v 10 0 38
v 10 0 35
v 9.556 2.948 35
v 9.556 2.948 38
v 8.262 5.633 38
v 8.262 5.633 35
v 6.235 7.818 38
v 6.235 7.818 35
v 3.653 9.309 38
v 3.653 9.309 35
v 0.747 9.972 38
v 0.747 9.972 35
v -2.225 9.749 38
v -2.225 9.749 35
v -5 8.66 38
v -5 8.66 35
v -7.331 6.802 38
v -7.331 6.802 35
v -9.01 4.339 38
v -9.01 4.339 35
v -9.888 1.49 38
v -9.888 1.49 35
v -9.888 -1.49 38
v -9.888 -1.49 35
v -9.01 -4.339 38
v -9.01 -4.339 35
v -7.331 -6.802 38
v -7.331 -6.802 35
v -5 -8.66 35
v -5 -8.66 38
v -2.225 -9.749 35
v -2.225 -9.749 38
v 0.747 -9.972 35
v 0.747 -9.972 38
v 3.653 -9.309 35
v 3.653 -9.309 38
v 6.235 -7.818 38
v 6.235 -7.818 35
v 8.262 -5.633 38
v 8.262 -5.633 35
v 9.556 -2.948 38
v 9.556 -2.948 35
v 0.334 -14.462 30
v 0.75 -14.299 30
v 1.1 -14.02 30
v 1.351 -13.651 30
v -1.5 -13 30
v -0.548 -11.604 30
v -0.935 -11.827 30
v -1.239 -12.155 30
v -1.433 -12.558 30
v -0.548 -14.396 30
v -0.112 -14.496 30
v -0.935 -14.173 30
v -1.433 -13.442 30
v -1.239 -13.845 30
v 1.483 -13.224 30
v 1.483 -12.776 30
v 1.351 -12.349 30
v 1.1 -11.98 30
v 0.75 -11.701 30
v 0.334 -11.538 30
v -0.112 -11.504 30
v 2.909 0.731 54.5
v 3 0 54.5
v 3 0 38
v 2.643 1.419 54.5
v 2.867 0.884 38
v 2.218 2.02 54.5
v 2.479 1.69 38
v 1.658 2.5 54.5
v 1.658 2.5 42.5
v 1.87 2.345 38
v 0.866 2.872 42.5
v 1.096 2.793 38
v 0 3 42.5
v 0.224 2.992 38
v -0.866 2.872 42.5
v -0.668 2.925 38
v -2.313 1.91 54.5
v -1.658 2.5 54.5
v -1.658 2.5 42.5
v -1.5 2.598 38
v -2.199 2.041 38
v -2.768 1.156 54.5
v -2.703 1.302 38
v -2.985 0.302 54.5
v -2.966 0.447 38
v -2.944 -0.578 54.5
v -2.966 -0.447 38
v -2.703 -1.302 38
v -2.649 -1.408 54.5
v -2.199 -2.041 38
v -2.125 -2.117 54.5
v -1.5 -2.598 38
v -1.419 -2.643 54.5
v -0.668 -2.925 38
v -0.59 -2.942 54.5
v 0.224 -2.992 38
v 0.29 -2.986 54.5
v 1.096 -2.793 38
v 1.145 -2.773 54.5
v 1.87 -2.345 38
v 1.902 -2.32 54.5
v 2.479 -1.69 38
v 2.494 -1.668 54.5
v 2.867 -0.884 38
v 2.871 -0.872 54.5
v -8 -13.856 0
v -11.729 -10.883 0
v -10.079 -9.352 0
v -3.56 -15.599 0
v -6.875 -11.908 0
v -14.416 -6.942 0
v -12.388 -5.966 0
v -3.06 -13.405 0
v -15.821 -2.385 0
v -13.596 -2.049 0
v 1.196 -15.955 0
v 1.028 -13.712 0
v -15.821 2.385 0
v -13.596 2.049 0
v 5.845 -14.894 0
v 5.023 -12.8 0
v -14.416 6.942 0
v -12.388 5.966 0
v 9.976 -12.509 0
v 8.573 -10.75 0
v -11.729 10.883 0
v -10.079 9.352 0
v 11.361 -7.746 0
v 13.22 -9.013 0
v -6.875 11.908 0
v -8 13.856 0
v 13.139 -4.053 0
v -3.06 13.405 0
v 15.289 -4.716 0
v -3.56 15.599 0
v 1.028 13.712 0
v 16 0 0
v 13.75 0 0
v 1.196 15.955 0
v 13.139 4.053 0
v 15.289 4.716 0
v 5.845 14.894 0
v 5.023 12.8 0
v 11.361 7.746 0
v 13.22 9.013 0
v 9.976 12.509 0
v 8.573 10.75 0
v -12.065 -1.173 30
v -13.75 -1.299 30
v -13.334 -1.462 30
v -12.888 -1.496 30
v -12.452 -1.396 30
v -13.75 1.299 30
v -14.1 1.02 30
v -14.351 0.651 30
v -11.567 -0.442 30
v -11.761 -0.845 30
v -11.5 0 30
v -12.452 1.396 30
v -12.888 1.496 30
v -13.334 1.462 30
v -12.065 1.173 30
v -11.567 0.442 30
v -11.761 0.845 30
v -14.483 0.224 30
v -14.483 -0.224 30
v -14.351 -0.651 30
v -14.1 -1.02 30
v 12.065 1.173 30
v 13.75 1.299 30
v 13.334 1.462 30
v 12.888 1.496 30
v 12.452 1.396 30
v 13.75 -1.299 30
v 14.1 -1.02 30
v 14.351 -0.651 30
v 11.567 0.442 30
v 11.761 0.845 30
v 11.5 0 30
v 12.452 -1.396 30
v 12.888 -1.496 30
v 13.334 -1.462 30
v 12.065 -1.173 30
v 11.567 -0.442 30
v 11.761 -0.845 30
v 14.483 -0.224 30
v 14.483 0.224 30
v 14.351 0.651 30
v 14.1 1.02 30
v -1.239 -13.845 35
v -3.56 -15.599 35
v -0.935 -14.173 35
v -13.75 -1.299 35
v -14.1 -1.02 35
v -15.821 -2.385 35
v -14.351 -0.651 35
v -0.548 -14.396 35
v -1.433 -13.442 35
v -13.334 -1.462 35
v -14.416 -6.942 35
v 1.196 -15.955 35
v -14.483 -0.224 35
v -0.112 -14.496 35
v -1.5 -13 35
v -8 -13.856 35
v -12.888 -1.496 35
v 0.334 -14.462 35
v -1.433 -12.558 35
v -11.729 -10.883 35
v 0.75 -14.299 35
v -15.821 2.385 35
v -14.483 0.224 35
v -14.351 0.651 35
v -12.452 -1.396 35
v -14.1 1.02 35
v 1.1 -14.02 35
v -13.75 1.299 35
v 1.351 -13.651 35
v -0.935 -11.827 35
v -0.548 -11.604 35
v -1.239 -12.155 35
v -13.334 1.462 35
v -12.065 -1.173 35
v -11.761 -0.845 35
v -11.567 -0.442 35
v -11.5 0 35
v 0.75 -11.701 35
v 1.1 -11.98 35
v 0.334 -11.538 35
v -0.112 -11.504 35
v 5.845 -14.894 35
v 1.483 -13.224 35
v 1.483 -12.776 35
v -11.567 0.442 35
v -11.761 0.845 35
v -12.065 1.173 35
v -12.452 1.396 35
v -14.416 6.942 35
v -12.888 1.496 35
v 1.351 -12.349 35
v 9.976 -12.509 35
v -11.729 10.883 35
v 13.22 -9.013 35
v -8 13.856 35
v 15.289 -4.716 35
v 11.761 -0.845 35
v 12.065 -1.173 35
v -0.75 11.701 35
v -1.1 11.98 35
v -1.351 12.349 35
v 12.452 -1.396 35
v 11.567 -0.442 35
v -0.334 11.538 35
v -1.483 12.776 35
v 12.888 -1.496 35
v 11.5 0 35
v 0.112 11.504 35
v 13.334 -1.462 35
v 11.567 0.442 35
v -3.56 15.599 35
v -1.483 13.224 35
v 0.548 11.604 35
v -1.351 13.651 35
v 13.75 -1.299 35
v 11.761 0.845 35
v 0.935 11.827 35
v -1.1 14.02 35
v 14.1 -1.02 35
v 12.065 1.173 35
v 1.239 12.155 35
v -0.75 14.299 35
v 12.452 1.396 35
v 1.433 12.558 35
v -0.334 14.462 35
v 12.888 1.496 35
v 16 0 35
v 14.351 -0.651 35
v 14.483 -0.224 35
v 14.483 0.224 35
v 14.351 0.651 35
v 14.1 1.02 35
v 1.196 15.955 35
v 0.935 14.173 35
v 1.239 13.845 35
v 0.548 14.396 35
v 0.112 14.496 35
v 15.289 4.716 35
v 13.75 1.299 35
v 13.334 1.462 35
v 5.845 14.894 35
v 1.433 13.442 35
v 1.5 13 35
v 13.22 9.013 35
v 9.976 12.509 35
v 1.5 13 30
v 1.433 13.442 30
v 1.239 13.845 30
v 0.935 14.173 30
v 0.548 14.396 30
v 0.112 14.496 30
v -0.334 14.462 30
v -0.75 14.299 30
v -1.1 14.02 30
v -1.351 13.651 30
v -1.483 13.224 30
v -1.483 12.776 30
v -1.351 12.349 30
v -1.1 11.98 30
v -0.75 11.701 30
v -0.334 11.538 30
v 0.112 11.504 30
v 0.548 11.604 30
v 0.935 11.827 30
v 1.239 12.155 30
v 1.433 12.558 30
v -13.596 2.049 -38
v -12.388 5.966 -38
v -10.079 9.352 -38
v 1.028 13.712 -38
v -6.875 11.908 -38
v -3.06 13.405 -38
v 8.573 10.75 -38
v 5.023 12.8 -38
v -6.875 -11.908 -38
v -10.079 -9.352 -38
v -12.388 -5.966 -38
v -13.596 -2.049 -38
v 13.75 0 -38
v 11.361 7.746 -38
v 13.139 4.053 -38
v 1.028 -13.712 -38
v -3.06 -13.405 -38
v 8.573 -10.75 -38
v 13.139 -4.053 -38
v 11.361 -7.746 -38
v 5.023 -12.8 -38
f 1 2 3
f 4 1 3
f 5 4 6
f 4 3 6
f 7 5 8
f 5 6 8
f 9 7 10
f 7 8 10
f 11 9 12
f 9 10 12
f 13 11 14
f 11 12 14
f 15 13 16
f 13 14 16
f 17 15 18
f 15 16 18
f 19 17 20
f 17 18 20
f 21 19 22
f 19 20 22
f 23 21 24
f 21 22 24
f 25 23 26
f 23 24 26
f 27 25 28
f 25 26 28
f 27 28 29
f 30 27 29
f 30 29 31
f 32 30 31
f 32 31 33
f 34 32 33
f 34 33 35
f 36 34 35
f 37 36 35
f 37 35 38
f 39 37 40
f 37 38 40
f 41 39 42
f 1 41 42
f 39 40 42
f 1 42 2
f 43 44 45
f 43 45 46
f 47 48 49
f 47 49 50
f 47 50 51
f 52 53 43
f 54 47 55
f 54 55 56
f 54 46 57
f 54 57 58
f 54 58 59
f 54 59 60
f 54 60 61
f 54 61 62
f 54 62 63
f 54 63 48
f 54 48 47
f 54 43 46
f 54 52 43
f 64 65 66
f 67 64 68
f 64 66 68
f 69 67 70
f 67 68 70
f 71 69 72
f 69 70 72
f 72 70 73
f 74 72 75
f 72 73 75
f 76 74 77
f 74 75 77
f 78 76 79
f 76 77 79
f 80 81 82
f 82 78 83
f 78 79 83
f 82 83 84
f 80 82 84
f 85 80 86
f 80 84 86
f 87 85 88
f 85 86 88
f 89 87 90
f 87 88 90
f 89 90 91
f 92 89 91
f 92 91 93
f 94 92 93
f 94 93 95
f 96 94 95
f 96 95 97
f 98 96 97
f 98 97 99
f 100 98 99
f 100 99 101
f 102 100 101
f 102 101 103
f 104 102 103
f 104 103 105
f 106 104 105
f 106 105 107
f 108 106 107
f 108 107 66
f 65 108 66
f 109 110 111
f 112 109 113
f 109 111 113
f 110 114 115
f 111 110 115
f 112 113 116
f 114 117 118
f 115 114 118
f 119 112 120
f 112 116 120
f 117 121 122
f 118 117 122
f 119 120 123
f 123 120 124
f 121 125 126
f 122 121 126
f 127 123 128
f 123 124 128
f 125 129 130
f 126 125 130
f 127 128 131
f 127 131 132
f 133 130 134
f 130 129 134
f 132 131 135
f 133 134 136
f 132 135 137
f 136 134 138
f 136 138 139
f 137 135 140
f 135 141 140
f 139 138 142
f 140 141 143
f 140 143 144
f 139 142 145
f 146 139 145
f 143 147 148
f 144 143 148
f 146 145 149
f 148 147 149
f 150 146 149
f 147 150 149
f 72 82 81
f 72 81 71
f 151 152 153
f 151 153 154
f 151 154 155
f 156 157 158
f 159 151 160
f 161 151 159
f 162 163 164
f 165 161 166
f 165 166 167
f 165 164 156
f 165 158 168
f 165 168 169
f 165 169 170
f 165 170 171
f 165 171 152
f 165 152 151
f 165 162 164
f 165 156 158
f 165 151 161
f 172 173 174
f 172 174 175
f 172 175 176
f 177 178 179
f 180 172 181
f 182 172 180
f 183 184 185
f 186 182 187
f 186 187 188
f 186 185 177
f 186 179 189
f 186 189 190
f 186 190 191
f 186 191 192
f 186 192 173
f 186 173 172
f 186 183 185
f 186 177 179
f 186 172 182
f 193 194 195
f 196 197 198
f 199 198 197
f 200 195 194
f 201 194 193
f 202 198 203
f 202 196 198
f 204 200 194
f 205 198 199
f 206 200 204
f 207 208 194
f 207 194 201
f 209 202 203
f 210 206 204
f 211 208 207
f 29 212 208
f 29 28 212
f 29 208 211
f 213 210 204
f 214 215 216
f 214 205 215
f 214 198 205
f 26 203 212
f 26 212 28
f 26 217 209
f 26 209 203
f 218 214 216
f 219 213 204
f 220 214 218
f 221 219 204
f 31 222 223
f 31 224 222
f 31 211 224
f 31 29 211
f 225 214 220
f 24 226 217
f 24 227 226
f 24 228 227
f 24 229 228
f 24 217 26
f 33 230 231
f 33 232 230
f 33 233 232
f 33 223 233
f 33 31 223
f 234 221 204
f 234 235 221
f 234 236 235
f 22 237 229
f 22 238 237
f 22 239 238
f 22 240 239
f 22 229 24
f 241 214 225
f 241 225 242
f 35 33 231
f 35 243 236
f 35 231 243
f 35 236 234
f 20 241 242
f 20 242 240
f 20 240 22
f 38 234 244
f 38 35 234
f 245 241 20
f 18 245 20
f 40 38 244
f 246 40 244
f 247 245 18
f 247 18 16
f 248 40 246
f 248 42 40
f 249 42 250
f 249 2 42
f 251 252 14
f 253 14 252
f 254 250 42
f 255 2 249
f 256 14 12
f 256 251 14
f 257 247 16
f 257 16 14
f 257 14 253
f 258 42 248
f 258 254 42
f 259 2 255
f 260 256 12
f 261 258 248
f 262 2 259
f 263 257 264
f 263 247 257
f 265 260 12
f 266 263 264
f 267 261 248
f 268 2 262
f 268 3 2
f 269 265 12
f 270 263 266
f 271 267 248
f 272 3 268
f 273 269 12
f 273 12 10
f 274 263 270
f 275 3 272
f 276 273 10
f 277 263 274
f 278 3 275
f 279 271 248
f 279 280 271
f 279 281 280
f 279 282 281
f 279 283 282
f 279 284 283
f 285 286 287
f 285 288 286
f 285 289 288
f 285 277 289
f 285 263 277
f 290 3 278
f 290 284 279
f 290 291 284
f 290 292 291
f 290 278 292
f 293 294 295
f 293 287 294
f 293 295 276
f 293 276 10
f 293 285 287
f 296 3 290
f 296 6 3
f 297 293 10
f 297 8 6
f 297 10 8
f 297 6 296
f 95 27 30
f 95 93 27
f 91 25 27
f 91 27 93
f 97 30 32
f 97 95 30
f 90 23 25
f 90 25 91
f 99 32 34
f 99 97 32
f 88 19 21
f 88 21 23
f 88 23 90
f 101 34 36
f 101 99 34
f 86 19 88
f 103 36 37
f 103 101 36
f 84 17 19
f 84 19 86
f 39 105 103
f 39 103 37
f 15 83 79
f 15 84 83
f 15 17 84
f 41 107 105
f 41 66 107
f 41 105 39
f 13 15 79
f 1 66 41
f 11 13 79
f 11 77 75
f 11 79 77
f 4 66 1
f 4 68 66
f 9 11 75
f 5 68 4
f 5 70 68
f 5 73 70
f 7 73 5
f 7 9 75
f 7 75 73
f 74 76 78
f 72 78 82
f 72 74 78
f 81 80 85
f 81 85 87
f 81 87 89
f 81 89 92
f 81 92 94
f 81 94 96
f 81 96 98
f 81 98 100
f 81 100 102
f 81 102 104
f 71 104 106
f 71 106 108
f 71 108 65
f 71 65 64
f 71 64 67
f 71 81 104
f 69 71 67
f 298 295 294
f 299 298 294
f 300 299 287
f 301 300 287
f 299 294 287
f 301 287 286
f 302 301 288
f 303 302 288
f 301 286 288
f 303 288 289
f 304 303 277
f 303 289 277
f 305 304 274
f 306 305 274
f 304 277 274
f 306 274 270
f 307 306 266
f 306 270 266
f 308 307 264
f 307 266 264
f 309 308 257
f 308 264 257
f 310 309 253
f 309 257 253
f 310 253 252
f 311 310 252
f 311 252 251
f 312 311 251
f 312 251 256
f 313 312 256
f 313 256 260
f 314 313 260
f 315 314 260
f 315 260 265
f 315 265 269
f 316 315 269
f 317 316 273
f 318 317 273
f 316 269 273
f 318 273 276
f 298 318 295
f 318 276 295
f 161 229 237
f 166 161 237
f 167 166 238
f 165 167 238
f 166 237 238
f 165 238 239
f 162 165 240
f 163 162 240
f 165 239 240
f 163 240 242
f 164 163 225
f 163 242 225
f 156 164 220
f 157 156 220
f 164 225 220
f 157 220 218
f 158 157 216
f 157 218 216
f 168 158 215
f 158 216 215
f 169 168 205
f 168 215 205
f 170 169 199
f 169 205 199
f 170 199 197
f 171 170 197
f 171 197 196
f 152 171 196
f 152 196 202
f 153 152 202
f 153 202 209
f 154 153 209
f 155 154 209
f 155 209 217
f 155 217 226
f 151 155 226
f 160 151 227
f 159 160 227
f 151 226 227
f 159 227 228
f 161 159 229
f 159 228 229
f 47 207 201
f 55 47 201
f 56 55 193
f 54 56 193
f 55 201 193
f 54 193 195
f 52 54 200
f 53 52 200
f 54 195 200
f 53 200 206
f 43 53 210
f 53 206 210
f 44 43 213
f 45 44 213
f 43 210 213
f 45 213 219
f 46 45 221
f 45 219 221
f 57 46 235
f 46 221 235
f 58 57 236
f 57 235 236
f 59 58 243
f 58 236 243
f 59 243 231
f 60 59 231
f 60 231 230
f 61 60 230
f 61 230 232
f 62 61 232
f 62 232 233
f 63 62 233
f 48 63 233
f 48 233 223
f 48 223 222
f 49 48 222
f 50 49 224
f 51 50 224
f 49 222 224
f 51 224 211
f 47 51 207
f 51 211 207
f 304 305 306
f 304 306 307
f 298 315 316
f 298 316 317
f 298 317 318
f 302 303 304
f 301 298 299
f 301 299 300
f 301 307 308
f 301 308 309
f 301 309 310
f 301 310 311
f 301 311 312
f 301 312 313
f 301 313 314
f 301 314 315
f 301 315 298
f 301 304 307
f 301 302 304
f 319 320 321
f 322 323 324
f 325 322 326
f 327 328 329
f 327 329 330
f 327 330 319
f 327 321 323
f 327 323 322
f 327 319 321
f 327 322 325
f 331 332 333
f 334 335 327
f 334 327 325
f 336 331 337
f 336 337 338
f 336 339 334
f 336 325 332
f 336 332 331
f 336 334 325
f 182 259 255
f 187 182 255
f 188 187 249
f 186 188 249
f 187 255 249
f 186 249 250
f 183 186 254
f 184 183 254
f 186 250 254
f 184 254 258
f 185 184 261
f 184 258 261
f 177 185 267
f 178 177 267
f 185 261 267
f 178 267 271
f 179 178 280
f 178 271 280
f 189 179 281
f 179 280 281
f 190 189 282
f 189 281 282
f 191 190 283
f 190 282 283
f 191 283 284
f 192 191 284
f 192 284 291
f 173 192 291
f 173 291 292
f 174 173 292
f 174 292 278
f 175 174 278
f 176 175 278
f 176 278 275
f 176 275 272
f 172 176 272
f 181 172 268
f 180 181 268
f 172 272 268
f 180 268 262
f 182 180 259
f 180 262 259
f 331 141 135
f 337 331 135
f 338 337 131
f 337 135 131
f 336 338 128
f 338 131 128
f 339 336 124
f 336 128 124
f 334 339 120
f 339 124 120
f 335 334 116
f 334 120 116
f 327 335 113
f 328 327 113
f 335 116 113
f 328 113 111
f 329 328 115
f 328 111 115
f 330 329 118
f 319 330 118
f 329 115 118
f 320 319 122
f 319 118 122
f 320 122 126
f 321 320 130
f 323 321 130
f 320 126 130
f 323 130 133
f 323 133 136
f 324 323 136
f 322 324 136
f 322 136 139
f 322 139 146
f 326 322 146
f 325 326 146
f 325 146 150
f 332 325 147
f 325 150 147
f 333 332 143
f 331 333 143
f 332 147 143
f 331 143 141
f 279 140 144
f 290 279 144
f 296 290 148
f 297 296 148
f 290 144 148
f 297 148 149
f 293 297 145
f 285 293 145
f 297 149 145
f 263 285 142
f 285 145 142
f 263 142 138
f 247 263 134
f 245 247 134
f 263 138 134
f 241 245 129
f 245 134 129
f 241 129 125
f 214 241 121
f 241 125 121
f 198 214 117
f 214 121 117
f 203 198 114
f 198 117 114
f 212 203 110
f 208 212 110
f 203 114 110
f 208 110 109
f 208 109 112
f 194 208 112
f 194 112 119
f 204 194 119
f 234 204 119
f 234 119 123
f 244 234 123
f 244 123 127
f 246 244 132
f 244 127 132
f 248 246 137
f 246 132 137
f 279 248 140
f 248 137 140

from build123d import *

# Parameters (mm, degrees)
SKETCH_1_R          = 16
EXTRUDE_1_DEPTH     = 35
SKETCH_2_R          = 10
EXTRUDE_2_DEPTH     = 3
SKETCH_3_R          = 3
EXTRUDE_3_DEPTH     = 16.5
CUT_EXTRUDE_START   = 3
SKETCH_4_W          = 9.243576196
SKETCH_4_H          = 12
CUT_EXTRUDE_1_DEPTH = 0.5
SKETCH_5_R          = 13.75
EXTRUDE_4_DEPTH     = 38
SKETCH_6_R          = 1.5
CUT_EXTRUDE_2_DEPTH = 5


with BuildPart() as part:
    # ｽｹｯﾁ1 → ﾎﾞｽ - 押し出し1 (new body)
    with BuildSketch(Plane.XY):
        Circle(SKETCH_1_R)
    extrude(amount=EXTRUDE_1_DEPTH)

    # ｽｹｯﾁ2 → ﾎﾞｽ - 押し出し2 (add)
    with BuildSketch(Plane.XY.offset(35)):
        Circle(SKETCH_2_R)
    extrude(amount=EXTRUDE_2_DEPTH)

    # ｽｹｯﾁ3 → ﾎﾞｽ - 押し出し3 (add)
    with BuildSketch(Plane.XY.offset(38)):
        Circle(SKETCH_3_R)
    extrude(amount=EXTRUDE_3_DEPTH)

    # ｽｹｯﾁ4 → ｶｯﾄ - 押し出し1 (cut)
    with BuildSketch(Plane(origin=(0, 0, 0), x_dir=(1, 0, 0), z_dir=(0, 1, 0)).offset(CUT_EXTRUDE_START)):
        with Locations((0, -48.5)):
            Rectangle(SKETCH_4_W, SKETCH_4_H)
    extrude(amount=-CUT_EXTRUDE_1_DEPTH, mode=Mode.SUBTRACT)

    # ｽｹｯﾁ5 → ﾎﾞｽ - 押し出し4 (add)
    with BuildSketch(Plane(origin=(0, 0, 0), x_dir=(-1, 0, 0), z_dir=(0, 0, -1))):
        with Locations(Location((0, 0, 0), (0, 0, 180))):
            Circle(SKETCH_5_R)
    extrude(amount=EXTRUDE_4_DEPTH)

    # ｽｹｯﾁ6 → ｶｯﾄ - 押し出し2 (cut)
    with BuildSketch(Plane.XY.offset(35)):
        with Locations((0, 13)):
            Circle(SKETCH_6_R)
        with Locations((-13, 0)):
            Circle(SKETCH_6_R)
        with Locations(Location((13, 0, 0), (0, 0, 180))):
            Circle(SKETCH_6_R)
        with Locations(Location((0, -13, 0), (0, 0, 180))):
            Circle(SKETCH_6_R)
    extrude(amount=-CUT_EXTRUDE_2_DEPTH, mode=Mode.SUBTRACT)


solid = part.part
